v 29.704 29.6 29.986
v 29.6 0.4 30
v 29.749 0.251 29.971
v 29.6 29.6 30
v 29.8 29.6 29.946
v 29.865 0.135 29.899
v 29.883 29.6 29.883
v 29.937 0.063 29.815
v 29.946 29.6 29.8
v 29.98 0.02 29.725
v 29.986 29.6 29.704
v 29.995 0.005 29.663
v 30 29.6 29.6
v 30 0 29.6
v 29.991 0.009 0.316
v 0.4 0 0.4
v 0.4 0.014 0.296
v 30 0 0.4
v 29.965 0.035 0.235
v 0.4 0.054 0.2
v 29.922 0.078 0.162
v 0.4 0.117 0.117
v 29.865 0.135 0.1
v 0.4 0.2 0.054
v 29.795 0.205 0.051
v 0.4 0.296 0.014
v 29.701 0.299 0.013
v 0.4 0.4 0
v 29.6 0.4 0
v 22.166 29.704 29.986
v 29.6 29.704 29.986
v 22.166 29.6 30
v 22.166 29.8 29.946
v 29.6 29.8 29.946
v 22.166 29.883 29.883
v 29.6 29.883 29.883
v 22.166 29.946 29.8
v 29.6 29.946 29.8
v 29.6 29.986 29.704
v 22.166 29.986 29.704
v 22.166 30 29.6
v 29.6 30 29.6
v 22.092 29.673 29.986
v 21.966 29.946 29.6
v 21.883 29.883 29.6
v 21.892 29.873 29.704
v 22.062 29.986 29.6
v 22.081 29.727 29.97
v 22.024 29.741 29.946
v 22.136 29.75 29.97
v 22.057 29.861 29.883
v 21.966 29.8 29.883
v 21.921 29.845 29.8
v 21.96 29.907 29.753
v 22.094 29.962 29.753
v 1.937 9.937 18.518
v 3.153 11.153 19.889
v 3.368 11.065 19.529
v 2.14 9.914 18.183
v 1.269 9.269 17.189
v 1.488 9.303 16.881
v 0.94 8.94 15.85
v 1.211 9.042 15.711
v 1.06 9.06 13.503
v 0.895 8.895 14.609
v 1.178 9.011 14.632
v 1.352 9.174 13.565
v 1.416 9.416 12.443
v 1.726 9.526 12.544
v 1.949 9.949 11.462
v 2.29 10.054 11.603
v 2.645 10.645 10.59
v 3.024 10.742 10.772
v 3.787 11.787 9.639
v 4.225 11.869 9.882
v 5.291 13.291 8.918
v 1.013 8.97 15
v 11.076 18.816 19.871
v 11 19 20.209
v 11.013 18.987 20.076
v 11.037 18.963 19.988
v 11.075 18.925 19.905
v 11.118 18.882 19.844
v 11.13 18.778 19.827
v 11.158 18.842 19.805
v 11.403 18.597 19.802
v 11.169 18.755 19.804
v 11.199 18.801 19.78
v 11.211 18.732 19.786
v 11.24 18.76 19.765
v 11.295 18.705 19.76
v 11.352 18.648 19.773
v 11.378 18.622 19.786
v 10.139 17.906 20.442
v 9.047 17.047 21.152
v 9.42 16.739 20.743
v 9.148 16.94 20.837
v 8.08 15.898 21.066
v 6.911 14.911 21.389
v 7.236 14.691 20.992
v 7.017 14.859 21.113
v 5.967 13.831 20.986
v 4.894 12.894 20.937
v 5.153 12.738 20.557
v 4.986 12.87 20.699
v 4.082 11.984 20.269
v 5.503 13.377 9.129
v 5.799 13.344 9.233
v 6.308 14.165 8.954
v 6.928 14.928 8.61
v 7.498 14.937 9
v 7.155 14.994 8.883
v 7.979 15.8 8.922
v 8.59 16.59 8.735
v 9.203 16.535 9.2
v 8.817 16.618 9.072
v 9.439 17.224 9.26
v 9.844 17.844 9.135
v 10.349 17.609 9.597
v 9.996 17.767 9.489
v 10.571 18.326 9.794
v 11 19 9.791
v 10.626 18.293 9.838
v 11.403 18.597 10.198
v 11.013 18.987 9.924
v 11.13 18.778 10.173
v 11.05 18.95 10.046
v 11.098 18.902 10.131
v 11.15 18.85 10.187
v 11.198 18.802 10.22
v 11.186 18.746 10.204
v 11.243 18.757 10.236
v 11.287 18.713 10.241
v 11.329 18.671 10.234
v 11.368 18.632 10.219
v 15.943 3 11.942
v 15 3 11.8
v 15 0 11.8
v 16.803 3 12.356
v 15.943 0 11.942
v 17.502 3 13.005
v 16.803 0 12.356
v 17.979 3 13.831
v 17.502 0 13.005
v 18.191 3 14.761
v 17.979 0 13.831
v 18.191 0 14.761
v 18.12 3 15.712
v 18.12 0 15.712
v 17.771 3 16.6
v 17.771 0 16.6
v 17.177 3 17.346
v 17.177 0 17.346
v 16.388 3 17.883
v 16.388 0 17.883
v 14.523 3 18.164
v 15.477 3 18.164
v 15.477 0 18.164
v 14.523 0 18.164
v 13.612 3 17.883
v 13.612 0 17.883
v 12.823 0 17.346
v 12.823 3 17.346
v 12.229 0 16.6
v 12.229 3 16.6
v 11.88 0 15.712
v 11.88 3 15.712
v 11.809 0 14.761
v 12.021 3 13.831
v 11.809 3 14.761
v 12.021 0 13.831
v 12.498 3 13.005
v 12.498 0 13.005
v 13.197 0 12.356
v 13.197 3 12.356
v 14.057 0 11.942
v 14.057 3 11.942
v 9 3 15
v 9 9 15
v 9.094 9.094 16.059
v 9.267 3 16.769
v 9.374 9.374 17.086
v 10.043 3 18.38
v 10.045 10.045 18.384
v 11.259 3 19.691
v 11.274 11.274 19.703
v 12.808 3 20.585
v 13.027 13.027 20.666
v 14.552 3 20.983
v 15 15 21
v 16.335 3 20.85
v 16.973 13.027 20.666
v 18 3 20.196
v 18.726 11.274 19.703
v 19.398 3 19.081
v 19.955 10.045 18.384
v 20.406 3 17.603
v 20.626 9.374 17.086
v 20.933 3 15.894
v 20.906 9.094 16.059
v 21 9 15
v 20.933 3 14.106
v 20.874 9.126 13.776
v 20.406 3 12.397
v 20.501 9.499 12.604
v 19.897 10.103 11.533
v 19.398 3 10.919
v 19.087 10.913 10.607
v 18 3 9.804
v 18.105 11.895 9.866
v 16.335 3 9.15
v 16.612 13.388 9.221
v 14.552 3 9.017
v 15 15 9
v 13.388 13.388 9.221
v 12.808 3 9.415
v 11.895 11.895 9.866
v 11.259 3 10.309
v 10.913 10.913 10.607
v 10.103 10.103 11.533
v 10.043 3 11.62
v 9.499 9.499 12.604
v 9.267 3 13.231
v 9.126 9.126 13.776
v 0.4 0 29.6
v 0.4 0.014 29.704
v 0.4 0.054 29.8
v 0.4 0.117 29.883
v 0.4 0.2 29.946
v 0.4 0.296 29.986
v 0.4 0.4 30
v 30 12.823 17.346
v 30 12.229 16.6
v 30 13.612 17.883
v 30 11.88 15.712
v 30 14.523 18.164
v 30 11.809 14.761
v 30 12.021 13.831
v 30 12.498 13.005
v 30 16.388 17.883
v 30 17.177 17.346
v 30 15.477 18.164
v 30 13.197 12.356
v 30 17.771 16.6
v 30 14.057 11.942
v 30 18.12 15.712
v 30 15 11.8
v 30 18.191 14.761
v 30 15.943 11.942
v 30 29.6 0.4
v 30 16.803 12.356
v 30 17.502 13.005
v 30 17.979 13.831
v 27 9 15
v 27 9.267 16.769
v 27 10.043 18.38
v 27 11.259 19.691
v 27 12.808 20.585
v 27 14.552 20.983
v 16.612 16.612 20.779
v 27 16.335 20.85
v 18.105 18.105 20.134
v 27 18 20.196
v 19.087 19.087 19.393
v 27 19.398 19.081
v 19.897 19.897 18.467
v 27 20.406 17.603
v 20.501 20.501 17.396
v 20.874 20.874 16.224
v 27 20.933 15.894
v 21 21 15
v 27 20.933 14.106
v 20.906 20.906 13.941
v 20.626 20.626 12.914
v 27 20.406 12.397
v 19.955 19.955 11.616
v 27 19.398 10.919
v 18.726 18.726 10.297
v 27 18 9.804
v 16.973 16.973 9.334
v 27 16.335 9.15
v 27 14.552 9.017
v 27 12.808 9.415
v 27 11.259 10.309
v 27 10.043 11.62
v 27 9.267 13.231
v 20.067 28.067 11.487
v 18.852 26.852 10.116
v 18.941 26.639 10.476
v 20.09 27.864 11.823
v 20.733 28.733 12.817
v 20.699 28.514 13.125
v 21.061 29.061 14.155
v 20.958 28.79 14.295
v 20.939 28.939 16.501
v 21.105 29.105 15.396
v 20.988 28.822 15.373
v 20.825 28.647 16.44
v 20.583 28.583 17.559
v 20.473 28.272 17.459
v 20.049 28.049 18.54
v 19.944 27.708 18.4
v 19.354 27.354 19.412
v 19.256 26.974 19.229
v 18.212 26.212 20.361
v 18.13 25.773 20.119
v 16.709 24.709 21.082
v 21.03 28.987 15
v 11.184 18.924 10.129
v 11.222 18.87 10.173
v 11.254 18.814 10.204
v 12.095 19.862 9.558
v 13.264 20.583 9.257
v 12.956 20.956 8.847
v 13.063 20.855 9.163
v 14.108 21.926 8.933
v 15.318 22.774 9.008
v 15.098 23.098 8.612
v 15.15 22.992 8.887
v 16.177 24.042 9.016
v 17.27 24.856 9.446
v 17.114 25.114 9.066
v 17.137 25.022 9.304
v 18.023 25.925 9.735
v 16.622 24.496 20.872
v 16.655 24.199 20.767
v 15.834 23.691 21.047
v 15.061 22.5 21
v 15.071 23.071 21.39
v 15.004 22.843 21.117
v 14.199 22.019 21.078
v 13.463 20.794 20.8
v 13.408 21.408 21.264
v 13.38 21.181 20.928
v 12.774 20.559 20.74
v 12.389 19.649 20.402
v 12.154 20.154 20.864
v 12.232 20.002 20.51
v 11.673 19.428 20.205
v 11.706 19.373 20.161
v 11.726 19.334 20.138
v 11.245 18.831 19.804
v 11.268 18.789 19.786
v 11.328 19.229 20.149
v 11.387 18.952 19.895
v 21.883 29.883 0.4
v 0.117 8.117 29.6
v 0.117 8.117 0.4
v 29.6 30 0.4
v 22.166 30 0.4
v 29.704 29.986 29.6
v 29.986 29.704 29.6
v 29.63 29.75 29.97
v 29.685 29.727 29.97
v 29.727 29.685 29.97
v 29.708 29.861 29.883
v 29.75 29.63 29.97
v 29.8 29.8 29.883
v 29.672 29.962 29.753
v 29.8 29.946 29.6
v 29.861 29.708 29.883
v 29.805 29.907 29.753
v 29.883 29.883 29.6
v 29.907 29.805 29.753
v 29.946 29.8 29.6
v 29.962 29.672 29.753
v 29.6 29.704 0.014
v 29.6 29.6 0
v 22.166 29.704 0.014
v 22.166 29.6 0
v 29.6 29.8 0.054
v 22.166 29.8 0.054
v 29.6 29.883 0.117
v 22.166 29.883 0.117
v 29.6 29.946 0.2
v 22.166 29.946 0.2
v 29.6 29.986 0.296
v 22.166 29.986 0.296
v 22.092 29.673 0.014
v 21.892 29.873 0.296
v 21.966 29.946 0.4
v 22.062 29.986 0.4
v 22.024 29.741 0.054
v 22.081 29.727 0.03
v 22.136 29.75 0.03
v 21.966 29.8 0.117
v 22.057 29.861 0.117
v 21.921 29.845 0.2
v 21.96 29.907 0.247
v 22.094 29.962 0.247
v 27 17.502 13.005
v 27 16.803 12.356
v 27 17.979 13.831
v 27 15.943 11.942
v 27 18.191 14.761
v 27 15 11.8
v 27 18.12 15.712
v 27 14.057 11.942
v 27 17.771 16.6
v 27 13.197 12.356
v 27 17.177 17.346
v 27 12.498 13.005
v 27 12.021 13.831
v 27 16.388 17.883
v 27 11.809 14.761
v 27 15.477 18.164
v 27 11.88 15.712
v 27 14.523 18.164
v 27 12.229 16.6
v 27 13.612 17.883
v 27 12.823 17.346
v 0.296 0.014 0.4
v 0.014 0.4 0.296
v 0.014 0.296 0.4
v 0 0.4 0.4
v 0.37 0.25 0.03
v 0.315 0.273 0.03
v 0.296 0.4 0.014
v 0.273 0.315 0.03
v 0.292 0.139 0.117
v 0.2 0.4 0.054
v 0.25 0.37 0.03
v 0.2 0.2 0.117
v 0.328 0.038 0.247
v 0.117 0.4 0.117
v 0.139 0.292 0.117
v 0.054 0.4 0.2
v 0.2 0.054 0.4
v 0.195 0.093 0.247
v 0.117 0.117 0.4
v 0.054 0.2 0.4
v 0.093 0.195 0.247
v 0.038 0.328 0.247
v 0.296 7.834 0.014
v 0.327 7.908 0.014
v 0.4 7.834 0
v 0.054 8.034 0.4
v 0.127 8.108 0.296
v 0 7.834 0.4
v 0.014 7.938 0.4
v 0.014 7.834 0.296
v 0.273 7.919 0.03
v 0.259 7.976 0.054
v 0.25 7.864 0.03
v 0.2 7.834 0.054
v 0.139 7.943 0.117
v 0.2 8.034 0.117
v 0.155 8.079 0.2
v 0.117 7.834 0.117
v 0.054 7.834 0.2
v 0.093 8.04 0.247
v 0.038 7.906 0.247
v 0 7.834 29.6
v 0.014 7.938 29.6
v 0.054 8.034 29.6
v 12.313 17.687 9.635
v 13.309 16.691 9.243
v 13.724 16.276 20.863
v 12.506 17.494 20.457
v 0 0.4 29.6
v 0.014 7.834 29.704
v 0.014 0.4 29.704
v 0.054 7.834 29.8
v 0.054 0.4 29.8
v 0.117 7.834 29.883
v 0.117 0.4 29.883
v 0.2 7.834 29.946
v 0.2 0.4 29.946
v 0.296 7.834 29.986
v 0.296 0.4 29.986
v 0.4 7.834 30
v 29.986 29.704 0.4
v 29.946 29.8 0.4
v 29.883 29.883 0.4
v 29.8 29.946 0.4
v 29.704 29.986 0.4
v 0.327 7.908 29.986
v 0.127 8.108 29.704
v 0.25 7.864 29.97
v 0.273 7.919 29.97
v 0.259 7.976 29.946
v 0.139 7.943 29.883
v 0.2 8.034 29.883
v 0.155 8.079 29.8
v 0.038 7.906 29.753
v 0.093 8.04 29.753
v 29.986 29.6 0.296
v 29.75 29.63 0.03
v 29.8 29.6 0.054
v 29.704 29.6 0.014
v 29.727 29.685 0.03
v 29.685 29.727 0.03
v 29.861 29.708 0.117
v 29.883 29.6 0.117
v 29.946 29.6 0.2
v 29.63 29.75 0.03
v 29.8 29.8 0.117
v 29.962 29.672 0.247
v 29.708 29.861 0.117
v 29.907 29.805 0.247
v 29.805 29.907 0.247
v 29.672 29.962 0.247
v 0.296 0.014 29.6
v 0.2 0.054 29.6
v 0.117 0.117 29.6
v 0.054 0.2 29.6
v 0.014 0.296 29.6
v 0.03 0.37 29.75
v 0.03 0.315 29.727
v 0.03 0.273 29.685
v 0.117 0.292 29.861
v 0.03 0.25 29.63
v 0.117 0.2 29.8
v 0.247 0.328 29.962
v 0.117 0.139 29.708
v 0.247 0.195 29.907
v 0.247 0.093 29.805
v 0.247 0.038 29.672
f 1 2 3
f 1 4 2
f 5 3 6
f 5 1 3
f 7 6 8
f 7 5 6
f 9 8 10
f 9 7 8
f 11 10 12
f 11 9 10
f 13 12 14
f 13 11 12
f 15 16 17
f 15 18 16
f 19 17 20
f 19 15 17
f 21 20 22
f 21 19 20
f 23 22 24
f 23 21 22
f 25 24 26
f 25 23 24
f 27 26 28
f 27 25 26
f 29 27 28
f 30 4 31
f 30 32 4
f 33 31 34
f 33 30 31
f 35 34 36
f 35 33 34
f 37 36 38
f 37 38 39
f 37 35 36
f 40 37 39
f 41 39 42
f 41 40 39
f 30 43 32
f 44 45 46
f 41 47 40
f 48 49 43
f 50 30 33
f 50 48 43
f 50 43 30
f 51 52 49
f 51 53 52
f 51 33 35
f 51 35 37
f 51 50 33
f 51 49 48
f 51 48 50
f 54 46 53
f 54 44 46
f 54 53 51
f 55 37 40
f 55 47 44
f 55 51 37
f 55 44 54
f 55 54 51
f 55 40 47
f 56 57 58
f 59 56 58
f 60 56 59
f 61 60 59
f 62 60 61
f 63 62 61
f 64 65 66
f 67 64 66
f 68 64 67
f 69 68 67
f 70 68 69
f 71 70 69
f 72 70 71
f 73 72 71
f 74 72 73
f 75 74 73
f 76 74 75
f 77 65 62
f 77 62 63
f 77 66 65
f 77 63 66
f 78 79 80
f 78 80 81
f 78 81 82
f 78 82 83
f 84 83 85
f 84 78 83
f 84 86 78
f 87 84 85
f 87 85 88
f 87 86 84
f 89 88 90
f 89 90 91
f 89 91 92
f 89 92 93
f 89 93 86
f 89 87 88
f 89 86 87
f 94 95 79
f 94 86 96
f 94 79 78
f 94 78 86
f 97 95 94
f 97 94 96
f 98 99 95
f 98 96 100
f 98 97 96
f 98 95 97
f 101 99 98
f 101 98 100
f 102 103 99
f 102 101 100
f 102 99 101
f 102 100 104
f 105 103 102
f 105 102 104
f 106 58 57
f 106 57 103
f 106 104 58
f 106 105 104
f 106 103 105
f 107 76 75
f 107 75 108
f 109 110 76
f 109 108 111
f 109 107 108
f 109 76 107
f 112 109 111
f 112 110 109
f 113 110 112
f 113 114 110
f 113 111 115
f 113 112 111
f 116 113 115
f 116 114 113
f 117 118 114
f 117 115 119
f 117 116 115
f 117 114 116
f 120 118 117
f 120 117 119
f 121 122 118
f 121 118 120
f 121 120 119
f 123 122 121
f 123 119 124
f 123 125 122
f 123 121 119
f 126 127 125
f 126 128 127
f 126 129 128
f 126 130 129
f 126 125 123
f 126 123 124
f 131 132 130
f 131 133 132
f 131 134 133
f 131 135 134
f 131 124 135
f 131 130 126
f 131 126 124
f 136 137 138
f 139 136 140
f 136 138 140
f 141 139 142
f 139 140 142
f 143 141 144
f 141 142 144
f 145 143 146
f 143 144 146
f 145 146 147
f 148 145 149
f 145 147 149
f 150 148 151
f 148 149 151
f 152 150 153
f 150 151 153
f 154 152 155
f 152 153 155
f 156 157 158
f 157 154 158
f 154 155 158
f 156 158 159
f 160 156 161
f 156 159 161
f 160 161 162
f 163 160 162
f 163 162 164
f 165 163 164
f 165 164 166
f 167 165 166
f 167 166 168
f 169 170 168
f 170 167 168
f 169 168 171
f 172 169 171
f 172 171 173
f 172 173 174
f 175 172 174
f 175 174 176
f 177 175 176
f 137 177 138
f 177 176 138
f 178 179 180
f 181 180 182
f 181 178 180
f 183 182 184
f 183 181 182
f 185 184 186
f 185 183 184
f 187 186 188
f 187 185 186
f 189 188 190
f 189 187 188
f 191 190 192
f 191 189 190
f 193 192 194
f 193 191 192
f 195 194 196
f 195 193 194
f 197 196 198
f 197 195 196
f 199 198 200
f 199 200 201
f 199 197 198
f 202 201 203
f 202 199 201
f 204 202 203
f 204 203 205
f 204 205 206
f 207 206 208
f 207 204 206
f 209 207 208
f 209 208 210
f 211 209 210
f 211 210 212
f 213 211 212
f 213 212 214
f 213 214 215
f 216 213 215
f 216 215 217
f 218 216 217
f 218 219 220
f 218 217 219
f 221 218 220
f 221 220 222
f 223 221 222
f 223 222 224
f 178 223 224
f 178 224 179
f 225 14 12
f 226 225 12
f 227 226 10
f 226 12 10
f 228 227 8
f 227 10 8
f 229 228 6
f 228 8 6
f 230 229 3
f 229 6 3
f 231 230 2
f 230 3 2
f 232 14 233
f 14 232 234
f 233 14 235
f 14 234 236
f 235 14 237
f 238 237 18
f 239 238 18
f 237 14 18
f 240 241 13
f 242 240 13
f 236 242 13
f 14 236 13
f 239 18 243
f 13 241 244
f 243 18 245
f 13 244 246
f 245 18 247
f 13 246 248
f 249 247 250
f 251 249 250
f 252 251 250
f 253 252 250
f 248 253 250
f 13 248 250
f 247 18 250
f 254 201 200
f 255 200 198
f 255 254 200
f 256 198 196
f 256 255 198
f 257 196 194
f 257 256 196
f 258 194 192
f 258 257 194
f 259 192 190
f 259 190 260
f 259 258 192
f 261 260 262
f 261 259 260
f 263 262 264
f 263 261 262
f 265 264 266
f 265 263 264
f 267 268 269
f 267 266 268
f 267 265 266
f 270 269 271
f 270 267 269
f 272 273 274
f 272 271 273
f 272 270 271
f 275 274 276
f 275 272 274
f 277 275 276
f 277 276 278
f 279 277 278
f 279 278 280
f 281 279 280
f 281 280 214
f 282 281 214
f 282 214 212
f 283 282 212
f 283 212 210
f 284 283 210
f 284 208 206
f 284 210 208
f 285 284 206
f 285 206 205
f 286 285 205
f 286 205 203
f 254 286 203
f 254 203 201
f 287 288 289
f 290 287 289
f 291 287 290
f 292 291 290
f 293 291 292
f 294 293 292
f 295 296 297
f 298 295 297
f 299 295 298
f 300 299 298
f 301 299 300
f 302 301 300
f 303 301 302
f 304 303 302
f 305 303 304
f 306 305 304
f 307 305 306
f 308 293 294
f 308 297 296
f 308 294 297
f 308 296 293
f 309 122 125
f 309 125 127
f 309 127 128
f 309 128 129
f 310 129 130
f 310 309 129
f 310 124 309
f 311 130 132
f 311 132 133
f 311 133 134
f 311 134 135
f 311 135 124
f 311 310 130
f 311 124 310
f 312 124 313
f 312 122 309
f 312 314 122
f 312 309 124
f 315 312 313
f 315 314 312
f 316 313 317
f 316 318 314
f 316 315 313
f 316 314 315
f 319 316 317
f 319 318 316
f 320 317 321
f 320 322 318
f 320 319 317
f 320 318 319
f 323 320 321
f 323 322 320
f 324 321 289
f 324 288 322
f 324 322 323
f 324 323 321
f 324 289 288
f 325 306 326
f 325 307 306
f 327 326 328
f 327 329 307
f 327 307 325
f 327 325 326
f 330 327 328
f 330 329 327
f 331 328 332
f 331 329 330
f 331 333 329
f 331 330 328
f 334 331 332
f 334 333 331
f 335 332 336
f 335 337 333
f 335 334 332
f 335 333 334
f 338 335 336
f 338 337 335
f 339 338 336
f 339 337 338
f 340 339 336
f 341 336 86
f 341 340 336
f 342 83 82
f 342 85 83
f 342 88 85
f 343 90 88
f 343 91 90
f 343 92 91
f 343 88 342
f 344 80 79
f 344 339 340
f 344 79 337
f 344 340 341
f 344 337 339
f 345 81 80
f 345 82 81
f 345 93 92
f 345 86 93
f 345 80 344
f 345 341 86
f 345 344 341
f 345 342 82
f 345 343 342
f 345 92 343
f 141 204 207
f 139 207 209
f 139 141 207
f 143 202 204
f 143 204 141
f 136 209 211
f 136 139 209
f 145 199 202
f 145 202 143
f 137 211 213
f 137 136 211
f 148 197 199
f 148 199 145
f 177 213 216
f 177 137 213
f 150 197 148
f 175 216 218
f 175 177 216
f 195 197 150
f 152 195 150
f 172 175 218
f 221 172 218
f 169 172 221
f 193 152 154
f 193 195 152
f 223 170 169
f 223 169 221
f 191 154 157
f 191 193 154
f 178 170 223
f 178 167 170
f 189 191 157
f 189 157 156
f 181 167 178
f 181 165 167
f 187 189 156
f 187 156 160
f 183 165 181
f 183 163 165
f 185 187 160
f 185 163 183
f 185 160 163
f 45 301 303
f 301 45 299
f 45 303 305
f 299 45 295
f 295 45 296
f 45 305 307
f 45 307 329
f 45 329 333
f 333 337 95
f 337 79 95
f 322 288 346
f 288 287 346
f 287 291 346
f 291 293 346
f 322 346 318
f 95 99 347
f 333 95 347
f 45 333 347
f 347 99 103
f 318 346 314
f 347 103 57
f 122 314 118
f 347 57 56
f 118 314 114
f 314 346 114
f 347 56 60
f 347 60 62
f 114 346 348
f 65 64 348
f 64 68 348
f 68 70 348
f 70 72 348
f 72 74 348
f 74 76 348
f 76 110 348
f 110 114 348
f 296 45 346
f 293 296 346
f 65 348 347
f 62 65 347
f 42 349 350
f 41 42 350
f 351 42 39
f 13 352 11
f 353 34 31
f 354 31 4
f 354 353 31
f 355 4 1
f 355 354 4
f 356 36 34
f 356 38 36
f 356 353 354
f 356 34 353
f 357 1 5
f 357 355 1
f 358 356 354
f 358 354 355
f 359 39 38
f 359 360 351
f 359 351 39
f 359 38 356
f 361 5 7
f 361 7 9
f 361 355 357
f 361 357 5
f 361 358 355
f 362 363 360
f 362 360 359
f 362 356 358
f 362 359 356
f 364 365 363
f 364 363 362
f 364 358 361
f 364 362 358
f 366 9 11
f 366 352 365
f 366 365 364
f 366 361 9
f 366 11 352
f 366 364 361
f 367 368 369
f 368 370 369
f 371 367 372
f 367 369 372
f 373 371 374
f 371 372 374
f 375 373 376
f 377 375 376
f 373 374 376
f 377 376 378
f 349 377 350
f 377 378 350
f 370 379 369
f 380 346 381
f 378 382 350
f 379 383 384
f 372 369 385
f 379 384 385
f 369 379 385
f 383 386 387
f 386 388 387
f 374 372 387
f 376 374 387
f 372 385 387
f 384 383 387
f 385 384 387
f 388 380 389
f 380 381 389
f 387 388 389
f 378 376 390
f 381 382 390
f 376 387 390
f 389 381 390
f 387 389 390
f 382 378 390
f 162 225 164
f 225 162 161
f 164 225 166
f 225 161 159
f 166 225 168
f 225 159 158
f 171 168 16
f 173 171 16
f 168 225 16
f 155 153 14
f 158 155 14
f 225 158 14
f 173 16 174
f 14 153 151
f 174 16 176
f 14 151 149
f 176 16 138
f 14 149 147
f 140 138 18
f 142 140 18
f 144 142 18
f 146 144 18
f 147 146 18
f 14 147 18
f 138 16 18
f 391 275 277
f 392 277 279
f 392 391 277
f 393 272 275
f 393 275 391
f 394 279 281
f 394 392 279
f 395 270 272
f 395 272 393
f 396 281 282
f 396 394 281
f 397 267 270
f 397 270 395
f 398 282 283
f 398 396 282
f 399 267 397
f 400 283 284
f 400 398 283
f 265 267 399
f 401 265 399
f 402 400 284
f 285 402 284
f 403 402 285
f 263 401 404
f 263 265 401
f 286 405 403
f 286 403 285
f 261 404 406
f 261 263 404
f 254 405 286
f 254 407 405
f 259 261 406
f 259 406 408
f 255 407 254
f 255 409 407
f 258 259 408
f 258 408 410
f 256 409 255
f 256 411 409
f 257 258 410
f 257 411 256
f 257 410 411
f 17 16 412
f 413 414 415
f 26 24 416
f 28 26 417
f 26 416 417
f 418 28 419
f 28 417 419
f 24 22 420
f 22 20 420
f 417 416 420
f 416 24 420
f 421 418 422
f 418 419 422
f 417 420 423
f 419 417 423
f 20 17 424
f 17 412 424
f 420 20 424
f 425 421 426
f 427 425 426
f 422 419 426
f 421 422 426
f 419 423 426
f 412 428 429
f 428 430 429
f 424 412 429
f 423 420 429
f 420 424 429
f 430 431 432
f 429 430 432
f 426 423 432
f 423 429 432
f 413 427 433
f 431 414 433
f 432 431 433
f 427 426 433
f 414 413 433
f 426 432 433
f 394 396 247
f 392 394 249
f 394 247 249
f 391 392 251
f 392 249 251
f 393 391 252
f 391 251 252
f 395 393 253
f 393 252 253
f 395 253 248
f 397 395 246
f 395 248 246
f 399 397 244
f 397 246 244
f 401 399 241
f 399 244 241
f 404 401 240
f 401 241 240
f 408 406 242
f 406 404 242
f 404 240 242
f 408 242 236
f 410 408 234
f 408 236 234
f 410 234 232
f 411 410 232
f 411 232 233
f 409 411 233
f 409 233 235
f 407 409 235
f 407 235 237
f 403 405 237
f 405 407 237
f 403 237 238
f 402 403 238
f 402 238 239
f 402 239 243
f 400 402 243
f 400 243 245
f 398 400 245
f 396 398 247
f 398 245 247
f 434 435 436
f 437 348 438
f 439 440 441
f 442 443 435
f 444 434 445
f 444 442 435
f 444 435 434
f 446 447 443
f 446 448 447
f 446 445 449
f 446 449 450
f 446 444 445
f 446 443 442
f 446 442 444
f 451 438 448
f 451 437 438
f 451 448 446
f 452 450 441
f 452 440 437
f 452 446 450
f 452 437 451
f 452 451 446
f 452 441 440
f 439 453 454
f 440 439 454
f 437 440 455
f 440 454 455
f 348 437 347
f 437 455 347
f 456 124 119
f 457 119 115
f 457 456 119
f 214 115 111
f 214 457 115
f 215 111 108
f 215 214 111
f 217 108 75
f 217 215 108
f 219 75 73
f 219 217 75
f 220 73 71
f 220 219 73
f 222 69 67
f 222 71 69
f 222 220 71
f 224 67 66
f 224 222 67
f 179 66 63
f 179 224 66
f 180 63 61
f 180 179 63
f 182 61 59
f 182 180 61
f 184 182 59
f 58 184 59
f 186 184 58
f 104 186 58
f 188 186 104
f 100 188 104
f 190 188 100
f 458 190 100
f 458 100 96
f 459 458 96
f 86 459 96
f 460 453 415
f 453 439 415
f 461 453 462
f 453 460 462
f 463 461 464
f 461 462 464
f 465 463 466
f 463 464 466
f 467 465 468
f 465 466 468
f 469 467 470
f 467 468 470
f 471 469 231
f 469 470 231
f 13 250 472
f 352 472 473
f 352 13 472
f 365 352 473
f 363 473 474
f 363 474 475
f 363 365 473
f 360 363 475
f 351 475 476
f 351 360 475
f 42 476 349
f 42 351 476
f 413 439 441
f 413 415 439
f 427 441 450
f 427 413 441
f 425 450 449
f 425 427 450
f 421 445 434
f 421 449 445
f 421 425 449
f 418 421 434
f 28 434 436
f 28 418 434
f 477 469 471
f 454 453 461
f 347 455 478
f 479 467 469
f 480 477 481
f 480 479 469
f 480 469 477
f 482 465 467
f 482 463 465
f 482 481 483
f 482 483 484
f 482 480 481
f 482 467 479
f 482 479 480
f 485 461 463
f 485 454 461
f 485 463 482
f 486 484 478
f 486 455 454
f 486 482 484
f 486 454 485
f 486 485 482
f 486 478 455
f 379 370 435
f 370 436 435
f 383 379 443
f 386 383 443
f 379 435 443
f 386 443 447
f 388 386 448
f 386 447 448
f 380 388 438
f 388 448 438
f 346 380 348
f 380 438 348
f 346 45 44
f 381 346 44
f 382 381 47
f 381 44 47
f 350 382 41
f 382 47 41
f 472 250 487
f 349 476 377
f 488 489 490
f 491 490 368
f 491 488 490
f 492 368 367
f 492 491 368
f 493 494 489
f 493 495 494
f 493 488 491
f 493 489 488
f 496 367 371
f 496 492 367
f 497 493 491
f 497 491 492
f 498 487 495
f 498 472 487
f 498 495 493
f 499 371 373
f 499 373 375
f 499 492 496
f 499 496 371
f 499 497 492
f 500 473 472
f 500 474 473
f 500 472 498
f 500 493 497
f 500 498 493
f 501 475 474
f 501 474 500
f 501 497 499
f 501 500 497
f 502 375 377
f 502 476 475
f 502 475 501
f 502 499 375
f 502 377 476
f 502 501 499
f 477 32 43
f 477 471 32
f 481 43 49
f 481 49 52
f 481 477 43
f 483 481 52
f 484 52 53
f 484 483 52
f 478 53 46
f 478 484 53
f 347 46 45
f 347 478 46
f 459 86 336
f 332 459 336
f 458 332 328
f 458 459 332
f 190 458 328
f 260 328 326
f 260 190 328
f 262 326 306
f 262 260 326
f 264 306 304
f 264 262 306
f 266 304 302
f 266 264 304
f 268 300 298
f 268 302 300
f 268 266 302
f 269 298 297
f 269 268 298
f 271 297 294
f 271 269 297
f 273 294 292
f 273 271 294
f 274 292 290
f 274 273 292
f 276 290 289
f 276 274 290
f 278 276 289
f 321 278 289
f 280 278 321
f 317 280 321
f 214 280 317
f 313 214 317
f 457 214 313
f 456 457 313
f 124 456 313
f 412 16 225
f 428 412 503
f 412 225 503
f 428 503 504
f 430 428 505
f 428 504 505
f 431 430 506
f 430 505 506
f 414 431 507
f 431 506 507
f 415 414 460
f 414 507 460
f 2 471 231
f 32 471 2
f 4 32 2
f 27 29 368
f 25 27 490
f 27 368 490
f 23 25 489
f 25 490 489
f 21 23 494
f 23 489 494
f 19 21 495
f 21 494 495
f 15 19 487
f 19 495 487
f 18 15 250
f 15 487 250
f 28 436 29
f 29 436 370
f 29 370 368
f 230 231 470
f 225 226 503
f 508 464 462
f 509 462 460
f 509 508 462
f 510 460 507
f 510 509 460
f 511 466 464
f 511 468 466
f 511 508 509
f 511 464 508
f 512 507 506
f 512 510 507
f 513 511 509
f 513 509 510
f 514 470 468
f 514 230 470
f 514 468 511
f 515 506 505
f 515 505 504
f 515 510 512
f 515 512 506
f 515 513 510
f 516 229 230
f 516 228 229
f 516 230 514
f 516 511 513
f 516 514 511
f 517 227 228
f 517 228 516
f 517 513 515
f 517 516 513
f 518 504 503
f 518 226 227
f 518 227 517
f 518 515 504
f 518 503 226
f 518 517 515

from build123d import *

# Parameters (mm, degrees)
BOSS_EXTRUDE1_DEPTH = 30
SKETCH3_R           = 3.2
CUT_EXTRUDE8_DEPTH  = 33
SKETCH5_R           = 3.2
CUT_EXTRUDE5_DEPTH  = 32
CUT_EXTRUDE9_START  = -27
SKETCH8_R           = 6
SKETCH8_R_2         = 3.2
CUT_EXTRUDE9_DEPTH  = 27
CUT_EXTRUDE10_START = -27
SKETCH7_R           = 6
SKETCH7_R_2         = 3.2
CUT_EXTRUDE10_DEPTH = 27
FILLET6_R           = 0.4


with BuildPart() as part:
    # Sketch2 → Boss-Extrude1 (new body)
    with BuildSketch(Plane.XY):
        Polygon((0, 0), (30, 0), (30, 30), (22, 30), (0, 8), align=None)
    extrude(amount=BOSS_EXTRUDE1_DEPTH)

    # Sketch3 → Cut-Extrude8 (cut)
    with BuildSketch(Plane(origin=(30, 0, 0), x_dir=(0, 0, -1), z_dir=(1, 0, 0))):
        with Locations((-15, 15)):
            Circle(SKETCH3_R)
    extrude(amount=-CUT_EXTRUDE8_DEPTH, mode=Mode.SUBTRACT)

    # Sketch5 → Cut-Extrude5 (cut)
    with BuildSketch(Plane.XZ):
        with Locations((15, 15)):
            Circle(SKETCH5_R)
    extrude(amount=-CUT_EXTRUDE5_DEPTH, mode=Mode.SUBTRACT)

    # Sketch8 → Cut-Extrude9 (cut)
    with BuildSketch(Plane.ZY.offset(CUT_EXTRUDE9_START)):
        with Locations((15, 15)):
            Circle(SKETCH8_R)
        with Locations((15, 15)):
            Circle(SKETCH8_R_2, mode=Mode.SUBTRACT)
    extrude(amount=CUT_EXTRUDE9_DEPTH, mode=Mode.SUBTRACT)

    # Sketch7 → Cut-Extrude10 (cut)
    with BuildSketch(Plane(origin=(0, 30, 0), x_dir=(1, 0, 0), z_dir=(0, 1, 0)).offset(CUT_EXTRUDE10_START)):
        with Locations((15, -15)):
            Circle(SKETCH7_R)
        with Locations((15, -15)):
            Circle(SKETCH7_R_2, mode=Mode.SUBTRACT)
    extrude(amount=CUT_EXTRUDE10_DEPTH, mode=Mode.SUBTRACT)

    # Fillet6
    fillet6_edges = [part.edges().sort_by_distance(p)[0] for p in [
        (30, 30, 15),
        (26, 30, 30),
        (30, 15, 30),
        (15, 0, 30),
        (0, 4, 30),
        (0, 0, 15),
        (15, 0, 0),
        (30, 15, 0),
        (26, 30, 0),
        (0, 4, 0),
        (22, 30, 15),
        (11, 19, 30),
        (0, 8, 15),
        (11, 19, 0),
        (1.671913993, 9.671913993, 12.241105383),
        (16.935572078, 24.935572078, 9.320778158),
    ]]
    fillet(fillet6_edges, radius=FILLET6_R)


solid = part.part
